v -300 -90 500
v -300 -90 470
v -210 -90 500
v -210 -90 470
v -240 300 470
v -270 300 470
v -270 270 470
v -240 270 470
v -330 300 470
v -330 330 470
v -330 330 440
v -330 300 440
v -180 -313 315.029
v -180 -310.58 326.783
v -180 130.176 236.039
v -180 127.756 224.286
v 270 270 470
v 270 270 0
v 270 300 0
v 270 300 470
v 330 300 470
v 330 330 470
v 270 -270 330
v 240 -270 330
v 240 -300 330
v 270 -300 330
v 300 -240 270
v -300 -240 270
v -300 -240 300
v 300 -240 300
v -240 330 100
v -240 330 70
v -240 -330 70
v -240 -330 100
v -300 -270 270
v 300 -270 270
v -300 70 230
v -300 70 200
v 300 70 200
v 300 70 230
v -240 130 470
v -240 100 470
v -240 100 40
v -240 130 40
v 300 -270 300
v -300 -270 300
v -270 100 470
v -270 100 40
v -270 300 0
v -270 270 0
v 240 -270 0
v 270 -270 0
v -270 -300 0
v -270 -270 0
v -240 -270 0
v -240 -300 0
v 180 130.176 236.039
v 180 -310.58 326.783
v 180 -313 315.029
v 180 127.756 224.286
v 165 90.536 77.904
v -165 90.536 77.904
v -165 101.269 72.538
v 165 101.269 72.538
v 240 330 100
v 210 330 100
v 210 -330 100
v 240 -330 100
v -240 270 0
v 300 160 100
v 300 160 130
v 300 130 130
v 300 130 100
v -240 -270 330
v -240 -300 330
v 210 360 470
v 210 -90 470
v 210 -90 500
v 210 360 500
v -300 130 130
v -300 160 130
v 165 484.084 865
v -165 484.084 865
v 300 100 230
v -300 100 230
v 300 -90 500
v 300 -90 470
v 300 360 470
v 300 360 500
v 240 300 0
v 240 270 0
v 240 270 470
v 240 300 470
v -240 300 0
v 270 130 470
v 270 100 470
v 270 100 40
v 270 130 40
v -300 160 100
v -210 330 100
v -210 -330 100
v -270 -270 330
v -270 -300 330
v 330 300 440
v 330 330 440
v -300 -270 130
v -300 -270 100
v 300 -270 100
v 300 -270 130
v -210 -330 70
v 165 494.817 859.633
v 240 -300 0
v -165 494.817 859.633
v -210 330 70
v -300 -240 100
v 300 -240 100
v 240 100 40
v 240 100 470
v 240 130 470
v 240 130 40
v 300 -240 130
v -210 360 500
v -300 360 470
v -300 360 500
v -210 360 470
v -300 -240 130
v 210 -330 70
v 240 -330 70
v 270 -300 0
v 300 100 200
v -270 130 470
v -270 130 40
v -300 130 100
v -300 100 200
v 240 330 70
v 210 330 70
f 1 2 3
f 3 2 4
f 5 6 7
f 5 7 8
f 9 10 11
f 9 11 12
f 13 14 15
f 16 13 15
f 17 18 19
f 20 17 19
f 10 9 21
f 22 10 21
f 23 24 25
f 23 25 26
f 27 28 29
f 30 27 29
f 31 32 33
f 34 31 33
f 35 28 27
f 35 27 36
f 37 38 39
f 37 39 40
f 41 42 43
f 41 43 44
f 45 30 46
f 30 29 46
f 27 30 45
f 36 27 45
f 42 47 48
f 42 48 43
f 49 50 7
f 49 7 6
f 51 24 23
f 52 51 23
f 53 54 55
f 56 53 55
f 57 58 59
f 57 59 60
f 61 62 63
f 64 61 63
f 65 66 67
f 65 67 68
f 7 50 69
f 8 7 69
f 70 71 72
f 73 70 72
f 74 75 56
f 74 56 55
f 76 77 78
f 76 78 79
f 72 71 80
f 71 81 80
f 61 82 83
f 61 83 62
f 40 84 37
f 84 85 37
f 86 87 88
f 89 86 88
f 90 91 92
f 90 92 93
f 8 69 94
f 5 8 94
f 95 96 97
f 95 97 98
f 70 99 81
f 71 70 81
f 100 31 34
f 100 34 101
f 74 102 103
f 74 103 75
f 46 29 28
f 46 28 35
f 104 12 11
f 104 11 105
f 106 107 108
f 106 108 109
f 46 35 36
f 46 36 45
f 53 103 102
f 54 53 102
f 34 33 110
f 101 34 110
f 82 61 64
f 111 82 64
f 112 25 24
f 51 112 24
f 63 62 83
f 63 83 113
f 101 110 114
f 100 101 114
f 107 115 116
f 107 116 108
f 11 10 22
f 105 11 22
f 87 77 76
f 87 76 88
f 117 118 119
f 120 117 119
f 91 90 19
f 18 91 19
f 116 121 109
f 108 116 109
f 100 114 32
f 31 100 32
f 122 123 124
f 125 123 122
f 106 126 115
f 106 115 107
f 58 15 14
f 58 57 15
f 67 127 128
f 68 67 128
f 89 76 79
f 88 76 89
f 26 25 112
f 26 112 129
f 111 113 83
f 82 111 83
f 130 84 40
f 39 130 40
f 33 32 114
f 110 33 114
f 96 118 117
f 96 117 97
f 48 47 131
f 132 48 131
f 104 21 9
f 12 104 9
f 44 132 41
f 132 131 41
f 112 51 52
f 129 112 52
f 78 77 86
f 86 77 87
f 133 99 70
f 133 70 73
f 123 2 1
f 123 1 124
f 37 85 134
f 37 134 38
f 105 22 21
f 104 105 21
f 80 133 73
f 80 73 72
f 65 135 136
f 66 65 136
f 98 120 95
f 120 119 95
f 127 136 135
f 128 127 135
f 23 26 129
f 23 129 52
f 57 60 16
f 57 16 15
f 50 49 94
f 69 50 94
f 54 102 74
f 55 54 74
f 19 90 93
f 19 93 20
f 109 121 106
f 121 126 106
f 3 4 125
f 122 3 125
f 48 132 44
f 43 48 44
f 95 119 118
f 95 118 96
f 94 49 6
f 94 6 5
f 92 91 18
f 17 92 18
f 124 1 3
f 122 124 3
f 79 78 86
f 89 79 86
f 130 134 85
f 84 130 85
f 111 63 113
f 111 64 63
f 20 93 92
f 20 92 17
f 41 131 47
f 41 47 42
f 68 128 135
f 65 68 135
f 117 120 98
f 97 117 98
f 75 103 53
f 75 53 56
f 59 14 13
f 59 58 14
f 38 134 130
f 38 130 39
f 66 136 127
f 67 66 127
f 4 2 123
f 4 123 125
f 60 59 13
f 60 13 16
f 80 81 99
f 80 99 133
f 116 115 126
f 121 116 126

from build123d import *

# Parameters (mm, degrees)
F2_W           = 30
F2_H           = 30
F3_DEPTH       = 330
F4_DEPTH       = 470
F7_DEPTH       = 30
F6_W           = 30
F6_H           = 30
F8_DEPTH       = 400
F8_DEPTH_BACK  = 30
F9_W           = 90
F9_H           = 450
F9_W_2         = 30
F9_H_2         = 30
F10_DEPTH      = 30
F11_W          = 30
F11_H          = 30
F12_DEPTH      = 30
F12_DEPTH_BACK = 570
F13_W          = 540
F13_H          = 30
F13_W_2        = 30
F13_W_3        = 90
F14_DEPTH      = 30
F16_DEPTH      = 180
F17_DEPTH      = 165


with BuildPart() as f3:
    # F2 (on Top) → F3 (new body)
    with BuildSketch(Plane.XY):
        with Locations((255, -285)):
            Rectangle(F2_W, F2_H)
    extrude(amount=F3_DEPTH)


with BuildPart() as f3b:
    # F2 (on Top) → F3, piece 2 (new body)
    with BuildSketch(Plane.XY):
        with Locations((-255, -285)):
            Rectangle(F2_W, F2_H)
    extrude(amount=F3_DEPTH)


with BuildPart() as f4:
    # F2 (on Top) → F4 (new body)
    with BuildSketch(Plane.XY):
        with Locations((-255, 285)):
            Rectangle(F2_W, F2_H)
    extrude(amount=F4_DEPTH)


with BuildPart() as f4b:
    # F2 (on Top) → F4, piece 2 (new body)
    with BuildSketch(Plane.XY):
        with Locations((255, 285)):
            Rectangle(F2_W, F2_H)
    extrude(amount=F4_DEPTH)


with BuildPart() as f7:
    # F6 (on offset) → F7 (new body)
    with BuildSketch(Plane.XY.offset(70)):
        Polygon((-210, -330), (-210, 330), (-240, 330), (-240, 130), (-240, 100), (-240, -330), align=None)
    extrude(amount=F7_DEPTH)


with BuildPart() as f7b:
    # F6 (on offset) → F7, piece 2 (new body)
    with BuildSketch(Plane.XY.offset(70)):
        Polygon((240, 130), (240, 330), (210, 330), (210, -330), (240, -330), (240, 100), align=None)
    extrude(amount=F7_DEPTH)


with BuildPart() as f8:
    # F6 (on offset) → F8 (new body, two sides)
    with BuildSketch(Plane.XY.offset(70)) as f8_sk:
        with Locations((-255, 115)):
            Rectangle(F6_W, F6_H)
    extrude(amount=F8_DEPTH)
    extrude(f8_sk.sketch, amount=-F8_DEPTH_BACK)


with BuildPart() as f8b:
    # F6 (on offset) → F8, piece 2 (new body, two sides)
    with BuildSketch(Plane.XY.offset(70)) as f8_2_sk:
        with Locations((255, 115)):
            Rectangle(F6_W, F6_H)
    extrude(amount=F8_DEPTH)
    extrude(f8_2_sk.sketch, amount=-F8_DEPTH_BACK)


with BuildPart() as f10:
    # F9 (on face) → F10 (new body)
    with BuildSketch(Plane.XY.offset(470)):
        with Locations((-255, 135)):
            Rectangle(F9_W, F9_H)
        with Locations((-255, 285)):
            Rectangle(F9_W_2, F9_H_2, mode=Mode.SUBTRACT)
        with Locations((-255, 285)):
            Rectangle(F9_W_2, F9_H_2)
    extrude(amount=F10_DEPTH)


with BuildPart() as f10b:
    # F9 (on face) → F10, piece 2 (new body)
    with BuildSketch(Plane.XY.offset(470)):
        with Locations((255, 135)):
            Rectangle(F9_W, F9_H)
    extrude(amount=F10_DEPTH)


with BuildPart() as f12:
    # F11 (on face) → F12 (new body, two sides)
    with BuildSketch(Plane(origin=(-270, 0, 0), x_dir=(0, -1, 0), z_dir=(-1, 0, 0))) as f12_sk:
        with Locations((-145, 115)):
            Rectangle(F11_W, F11_H)
    extrude(amount=F12_DEPTH)
    extrude(f12_sk.sketch, amount=-F12_DEPTH_BACK)


with BuildPart() as f12b:
    # F11 (on face) → F12, piece 2 (new body, two sides)
    with BuildSketch(Plane(origin=(-270, 0, 0), x_dir=(0, -1, 0), z_dir=(-1, 0, 0))) as f12_2_sk:
        with Locations((255, 115)):
            Rectangle(F11_W, F11_H)
    extrude(amount=F12_DEPTH)
    extrude(f12_2_sk.sketch, amount=-F12_DEPTH_BACK)


with BuildPart() as f12c:
    # F11 (on face) → F12, piece 3 (new body, two sides)
    with BuildSketch(Plane(origin=(-270, 0, 0), x_dir=(0, -1, 0), z_dir=(-1, 0, 0))) as f12_3_sk:
        with Locations((-85, 215)):
            Rectangle(F11_W, F11_H)
    extrude(amount=F12_DEPTH)
    extrude(f12_3_sk.sketch, amount=-F12_DEPTH_BACK)


with BuildPart() as f12d:
    # F11 (on face) → F12, piece 4 (new body, two sides)
    with BuildSketch(Plane(origin=(-270, 0, 0), x_dir=(0, -1, 0), z_dir=(-1, 0, 0))) as f12_4_sk:
        with Locations((255, 285)):
            Rectangle(F11_W, F11_H)
    extrude(amount=F12_DEPTH)
    extrude(f12_4_sk.sketch, amount=-F12_DEPTH_BACK)


with BuildPart() as f14:
    # F13 (on face) → F14 (new body)
    with BuildSketch(Plane(origin=(0, 0, 470), x_dir=(1, 0, 0), z_dir=(0, 0, -1))):
        with Locations((-60, -315)):
            Rectangle(F13_W, F13_H)
        with Locations((315, -315)):
            Rectangle(F13_W_2, F13_H)
        with Locations((255, -315)):
            Rectangle(F13_W_3, F13_H)
    extrude(amount=F14_DEPTH)


with BuildPart() as f16:
    # F15 (on Right) → F16 (new body, symmetric)
    with BuildSketch(Plane.YZ):
        Polygon((-310.580164952, 326.7828962838), (-313, 315.0294117647), (127.7556694655, 224.285597463), (130.1755045135, 236.0390819821), align=None)
    extrude(amount=F16_DEPTH, both=True)


with BuildPart() as f17:
    # F15 (on Right) → F17 (new body, symmetric)
    with BuildSketch(Plane.YZ):
        Polygon((101.268754387, 72.5375087741), (494.816718427, 859.633436854), (484.083592135, 865), (90.535628095, 77.9040719201), align=None)
    extrude(amount=F17_DEPTH, both=True)


solid = Compound([f3.part, f3b.part, f4.part, f4b.part, f7.part, f7b.part, f8.part, f8b.part, f10.part, f10b.part, f12.part, f12b.part, f12c.part, f12d.part, f14.part, f16.part, f17.part])
